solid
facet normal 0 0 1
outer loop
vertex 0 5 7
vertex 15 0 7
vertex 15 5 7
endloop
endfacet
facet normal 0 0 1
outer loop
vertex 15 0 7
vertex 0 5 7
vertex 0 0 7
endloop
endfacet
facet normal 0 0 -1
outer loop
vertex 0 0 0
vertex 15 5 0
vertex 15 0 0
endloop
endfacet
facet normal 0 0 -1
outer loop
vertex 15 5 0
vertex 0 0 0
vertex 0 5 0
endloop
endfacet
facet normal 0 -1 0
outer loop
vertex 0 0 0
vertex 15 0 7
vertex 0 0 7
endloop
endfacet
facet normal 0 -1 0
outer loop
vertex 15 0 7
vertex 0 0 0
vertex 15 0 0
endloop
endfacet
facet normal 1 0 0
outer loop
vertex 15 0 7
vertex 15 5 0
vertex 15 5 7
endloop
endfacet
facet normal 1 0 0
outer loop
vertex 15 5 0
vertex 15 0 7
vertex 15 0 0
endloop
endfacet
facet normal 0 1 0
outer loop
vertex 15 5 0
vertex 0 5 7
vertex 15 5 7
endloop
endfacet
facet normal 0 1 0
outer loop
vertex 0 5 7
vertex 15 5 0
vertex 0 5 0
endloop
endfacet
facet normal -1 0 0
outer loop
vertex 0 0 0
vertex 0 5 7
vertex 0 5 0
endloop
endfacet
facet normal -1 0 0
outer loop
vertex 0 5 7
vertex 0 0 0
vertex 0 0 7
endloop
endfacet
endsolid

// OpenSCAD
// Generated by SolidPython 1.0.1 on 2020-07-29 00:46:55


cube(size = [15, 5, 7]);
/***********************************************
*********      SolidPython code:      **********
************************************************
 
# import packages: SolidPython
from solid import *
from solid.utils import *
from itertools import chain, combinations, permutations


class Resize:

    def __init__(self, scad_file):
        self.scad_file = scad_file
        #self.scad_file = import_scad(scad_file)
        # cone/cylinder param:
        self.r1 = 0
        self.r2 = 0
        self.h = 0
        # rectangular prism param:
        self.w = 0
        self.l = 0
        # ellipse param:
        self.r = 0

    # import OpenScad code (file name corresponds to shape)


    # classify shape + parameters
    def assign(self, param1, param2, param3):
        if self.scad_file == 'cone.scad':
            self.r1 = param1
            self.r2 = param2
            self.h = param3
        elif self.scad_file == 'cylinder.scad':
            self.r1 = param1
            self.r2 = param2
            self.h = param3
        elif self.scad_file == 'rectangularPrism.scad':
            self.h = param1
            self.l = param2
            self.w = param3
        else:
            self.r = param1
            self.h = param2

    # resize parameters
    def iterate(self):
        x = range(3, 20, 2)
        i = 1
        if self.scad_file == 'cone.scad':
            tempList = list(permutations(x, 2))
            for temp in tempList:
                param1 = temp[0]
                param2 = temp[1]
                filepath = 'produced_scad_files/' + 'cone' + str(param1) + '_' + str(param2) + '_' + '.scad'
                scad_render_to_file(cylinder(h=param1, r1=param2, r2=0), filepath)

        elif self.scad_file == 'cylinder.scad':
            tempList = list(permutations(x, 3))
            for temp in tempList:
                param1 = temp[0]
                param2 = temp[1]
                filepath = 'produced_scad_files/' + 'cylinder' + str(param1) + '_' + str(param2) + '_' + '.scad'
                scad_render_to_file(cylinder(h=param1, r1=param2, r2=param2), filepath)

        elif self.scad_file == 'rectangularPrism.scad':
            tempList = list(permutations(x, 3))
            for temp in tempList:
                param1 = temp[0]
                param2 = temp[1]
                param3 = temp[2]
                filepath = 'produced_scad_files/' + 'rectangularPrism' + str(param1) + '_' + str(param2) + '_' + str(
                    param3) + '.scad'
                scad_render_to_file(cube(size=(param1, param2, param3)), filepath)

        elif self.scad_file == 'ellipse.scad':
            tempList = list(permutations(x, 4))
            for temp in tempList:
                param1 = temp[0]
                param2 = temp[1]
                param3 = temp[2]
                param4 = temp[3]
                filepath = 'produced_scad_files/' + 'ellipse' + str(param1) + '_' + str(param2) + '_' + str(param3) + '_' + str(param4) + '.scad'
                scad_render_to_file(scale([param1, param2, param3])(sphere(r=param4)), filepath)

    def render_to_scadfile(self):
        scad_render_to_file(scad, 'example.scad') 
 
************************************************/
